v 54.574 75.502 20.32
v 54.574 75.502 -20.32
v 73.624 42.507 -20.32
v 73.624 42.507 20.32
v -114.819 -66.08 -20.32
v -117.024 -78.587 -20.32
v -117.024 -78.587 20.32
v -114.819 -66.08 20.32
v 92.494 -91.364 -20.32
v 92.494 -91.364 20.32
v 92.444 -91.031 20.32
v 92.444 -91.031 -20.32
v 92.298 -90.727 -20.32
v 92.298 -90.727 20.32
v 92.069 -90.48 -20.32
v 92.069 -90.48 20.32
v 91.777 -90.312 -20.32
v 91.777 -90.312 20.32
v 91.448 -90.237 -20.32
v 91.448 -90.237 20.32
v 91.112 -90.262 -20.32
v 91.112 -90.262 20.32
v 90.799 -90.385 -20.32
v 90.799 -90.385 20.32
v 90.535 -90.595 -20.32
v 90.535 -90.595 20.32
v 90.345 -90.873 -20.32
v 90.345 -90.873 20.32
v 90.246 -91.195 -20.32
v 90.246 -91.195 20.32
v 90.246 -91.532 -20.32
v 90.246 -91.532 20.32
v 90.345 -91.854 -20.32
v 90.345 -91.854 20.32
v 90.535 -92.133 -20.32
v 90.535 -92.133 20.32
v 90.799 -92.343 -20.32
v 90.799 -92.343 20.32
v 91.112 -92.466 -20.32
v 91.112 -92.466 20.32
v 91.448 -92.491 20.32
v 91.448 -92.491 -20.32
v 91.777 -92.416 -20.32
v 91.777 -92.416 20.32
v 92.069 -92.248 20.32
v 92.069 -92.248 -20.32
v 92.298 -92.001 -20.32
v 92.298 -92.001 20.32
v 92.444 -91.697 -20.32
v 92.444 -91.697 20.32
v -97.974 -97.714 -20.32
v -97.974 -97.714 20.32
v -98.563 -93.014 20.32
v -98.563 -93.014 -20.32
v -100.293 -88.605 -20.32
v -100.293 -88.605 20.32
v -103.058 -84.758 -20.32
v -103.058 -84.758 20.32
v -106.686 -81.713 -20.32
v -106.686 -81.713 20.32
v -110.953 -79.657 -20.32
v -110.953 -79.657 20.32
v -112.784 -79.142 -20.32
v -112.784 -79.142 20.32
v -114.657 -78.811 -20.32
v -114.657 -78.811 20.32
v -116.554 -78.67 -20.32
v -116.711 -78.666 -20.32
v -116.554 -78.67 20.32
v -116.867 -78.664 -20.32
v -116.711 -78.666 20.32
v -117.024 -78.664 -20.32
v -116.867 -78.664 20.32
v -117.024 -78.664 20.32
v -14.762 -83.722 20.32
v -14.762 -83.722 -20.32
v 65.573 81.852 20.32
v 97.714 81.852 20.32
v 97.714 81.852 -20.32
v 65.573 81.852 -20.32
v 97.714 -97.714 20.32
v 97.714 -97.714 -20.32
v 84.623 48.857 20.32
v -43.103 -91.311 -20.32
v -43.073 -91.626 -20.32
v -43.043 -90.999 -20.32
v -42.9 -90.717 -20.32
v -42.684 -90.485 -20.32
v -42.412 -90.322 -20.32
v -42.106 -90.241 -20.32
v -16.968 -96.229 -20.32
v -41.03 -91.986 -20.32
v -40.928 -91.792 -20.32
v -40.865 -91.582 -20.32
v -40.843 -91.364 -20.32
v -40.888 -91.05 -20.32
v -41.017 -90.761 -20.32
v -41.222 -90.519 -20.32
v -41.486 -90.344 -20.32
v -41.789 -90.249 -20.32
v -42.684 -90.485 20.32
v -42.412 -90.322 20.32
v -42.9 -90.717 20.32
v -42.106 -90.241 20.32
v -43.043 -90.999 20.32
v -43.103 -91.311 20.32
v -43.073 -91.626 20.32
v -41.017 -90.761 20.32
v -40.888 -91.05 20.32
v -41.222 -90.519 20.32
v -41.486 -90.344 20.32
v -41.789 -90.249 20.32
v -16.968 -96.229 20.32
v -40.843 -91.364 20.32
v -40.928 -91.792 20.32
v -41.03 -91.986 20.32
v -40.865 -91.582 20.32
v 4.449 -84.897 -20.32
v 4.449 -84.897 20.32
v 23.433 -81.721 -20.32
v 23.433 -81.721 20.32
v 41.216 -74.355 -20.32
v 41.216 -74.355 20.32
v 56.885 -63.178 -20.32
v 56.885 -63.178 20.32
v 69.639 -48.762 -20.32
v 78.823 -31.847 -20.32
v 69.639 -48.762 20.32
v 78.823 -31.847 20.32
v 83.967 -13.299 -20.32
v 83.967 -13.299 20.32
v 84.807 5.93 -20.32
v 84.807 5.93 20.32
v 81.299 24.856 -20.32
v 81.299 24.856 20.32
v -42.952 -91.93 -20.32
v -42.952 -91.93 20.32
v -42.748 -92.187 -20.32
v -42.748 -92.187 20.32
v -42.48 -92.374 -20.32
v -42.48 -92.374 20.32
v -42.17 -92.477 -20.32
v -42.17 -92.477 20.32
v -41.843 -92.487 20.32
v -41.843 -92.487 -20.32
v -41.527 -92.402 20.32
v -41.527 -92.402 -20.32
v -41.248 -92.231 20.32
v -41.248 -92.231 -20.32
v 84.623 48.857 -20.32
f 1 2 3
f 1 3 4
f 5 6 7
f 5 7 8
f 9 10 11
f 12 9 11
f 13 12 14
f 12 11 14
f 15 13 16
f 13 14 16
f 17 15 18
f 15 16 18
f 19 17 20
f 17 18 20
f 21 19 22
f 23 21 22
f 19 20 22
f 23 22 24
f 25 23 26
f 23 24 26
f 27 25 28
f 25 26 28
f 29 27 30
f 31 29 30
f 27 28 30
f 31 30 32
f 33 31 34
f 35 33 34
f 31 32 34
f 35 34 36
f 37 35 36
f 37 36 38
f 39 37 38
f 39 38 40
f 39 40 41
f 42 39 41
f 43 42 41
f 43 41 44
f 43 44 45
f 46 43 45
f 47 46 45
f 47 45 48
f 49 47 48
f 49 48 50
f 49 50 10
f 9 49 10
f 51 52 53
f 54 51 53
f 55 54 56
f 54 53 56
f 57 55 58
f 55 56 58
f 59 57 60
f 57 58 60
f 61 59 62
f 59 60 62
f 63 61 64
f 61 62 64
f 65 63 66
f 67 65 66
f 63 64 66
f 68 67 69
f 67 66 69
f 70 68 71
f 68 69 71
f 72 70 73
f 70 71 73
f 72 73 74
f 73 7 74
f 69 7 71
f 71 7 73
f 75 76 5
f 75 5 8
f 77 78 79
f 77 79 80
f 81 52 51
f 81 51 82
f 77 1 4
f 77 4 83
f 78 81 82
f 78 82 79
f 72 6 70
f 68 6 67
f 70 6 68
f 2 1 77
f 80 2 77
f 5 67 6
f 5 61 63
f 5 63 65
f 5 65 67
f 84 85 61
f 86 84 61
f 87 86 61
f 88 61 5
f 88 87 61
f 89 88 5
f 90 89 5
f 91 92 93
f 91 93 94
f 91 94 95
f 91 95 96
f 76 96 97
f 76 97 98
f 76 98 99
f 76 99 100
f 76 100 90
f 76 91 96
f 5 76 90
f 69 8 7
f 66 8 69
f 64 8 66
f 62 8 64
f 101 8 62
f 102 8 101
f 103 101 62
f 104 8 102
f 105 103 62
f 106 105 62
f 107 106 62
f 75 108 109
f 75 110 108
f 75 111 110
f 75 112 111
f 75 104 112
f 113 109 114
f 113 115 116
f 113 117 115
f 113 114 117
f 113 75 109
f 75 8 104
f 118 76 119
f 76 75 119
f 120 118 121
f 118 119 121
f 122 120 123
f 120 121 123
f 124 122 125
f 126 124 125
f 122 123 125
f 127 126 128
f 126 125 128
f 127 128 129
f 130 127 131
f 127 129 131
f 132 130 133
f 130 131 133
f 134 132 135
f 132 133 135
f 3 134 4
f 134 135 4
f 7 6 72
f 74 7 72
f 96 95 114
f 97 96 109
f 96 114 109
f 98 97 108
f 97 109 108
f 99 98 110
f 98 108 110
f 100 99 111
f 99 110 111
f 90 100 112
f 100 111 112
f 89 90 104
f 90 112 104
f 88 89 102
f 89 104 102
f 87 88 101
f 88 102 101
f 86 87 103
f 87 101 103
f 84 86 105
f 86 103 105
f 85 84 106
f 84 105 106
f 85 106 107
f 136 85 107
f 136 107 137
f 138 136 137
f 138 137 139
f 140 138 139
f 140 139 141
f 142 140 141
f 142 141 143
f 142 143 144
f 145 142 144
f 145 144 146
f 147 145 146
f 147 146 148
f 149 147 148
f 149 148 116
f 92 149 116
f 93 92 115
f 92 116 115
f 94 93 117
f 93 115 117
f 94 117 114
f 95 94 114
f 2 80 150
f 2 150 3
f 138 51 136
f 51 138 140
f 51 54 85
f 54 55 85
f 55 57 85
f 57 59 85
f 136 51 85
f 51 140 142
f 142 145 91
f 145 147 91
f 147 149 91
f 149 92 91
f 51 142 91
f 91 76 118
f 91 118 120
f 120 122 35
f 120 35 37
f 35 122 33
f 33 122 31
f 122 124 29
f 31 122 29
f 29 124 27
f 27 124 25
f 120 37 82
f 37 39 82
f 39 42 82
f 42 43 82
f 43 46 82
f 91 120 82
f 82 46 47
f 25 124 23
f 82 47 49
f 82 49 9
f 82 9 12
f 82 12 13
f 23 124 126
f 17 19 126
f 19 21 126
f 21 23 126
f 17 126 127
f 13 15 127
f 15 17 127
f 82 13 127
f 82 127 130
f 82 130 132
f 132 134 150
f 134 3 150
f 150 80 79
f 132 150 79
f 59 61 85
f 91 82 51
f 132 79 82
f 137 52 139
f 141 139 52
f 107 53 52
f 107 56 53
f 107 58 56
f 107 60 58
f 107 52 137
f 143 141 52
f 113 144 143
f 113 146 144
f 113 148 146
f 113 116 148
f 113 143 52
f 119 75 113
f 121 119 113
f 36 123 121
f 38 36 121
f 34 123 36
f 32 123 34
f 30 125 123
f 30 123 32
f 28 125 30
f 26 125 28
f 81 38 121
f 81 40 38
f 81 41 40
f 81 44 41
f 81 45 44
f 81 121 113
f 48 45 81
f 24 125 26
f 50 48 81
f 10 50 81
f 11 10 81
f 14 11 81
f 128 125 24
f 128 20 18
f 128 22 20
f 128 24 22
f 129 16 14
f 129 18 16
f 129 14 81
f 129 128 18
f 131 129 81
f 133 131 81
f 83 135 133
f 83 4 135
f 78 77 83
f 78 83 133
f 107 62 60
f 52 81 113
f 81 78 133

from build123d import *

# Parameters (mm, degrees)
BOSS_EXTRUDE1_DEPTH = 40.64
SKETCH6_R           = 1.1303
CUT_EXTRUDE1_DEPTH  = 158.779215984
SKETCH7_R           = 19.05
CUT_EXTRUDE2_DEPTH  = 158.779215984


with BuildPart() as part:
    # Sweep3: sweep along a path in Sketch2
    with BuildLine(Plane.XY) as sweep3_path:
        Line((-111.378641457, -46.568583299), (-11.322173751, -64.21123815))
        ThreePointArc((-11.322173751, -64.21123815), (53.410187761, -37.398216088), (56.466415172, 32.6009))
        Line((56.466415172, 32.6009), (37.416415172, 65.596467884))
    # 3DSketch1 → Sweep3 (sweep)
    with BuildSketch(Plane(origin=(-117.024291009, -78.586652965, -20.32), x_dir=(0.051794909001673446, 0.2937435257699459, 0.9544799780350292), z_dir=(0.984807753012208, -0.17364817766693055, 0))):
        Polygon((0, 0), (3.788092413, -12.121895721), (42.57815872, 0), (38.790066307, 12.121895721), align=None)
    sweep(path=sweep3_path.line)

    # Sketch5 → Boss-Extrude1 (add)
    with BuildSketch(Plane.XY.offset(20.32)):
        with BuildLine():
            Line((-16.967823303, -96.229307816), (-117.024291009, -78.586652965))
            Line((-117.024291009, -78.586652965), (-117.024291009, -97.7138))
            Line((-117.024291009, -97.7138), (3.02e-07, -97.7138))
            ThreePointArc((3.02e-07, -97.7138), (-8.516318665, -97.341969504), (-16.967823303, -96.229307816))
        make_face()
        with BuildLine():
            ThreePointArc((97.7138, -9e-08), (69.09409067, -69.094090521), (3.02e-07, -97.7138))
            Line((3.02e-07, -97.7138), (97.7138, -97.7138))
            Line((97.7138, -97.7138), (97.7138, -9e-08))
        make_face()
        with BuildLine():
            ThreePointArc((84.6226331, 48.8569), (94.384283017, 25.290192366), (97.7138, -9e-08))
            Line((97.7138, -9e-08), (97.7138, 81.852467884))
            Line((97.7138, 81.852467884), (65.5726331, 81.852467884))
            Line((65.5726331, 81.852467884), (84.6226331, 48.8569))
        make_face()
    extrude(amount=-BOSS_EXTRUDE1_DEPTH)

    # Sketch6 → Cut-Extrude1 (cut, through all)
    with BuildSketch(Plane.XY.offset(20.32)):
        with Locations((91.3638, -91.3638)):
            Circle(SKETCH6_R)
        with Locations((-41.9735, -91.3638)):
            Circle(SKETCH6_R)
    extrude(amount=-CUT_EXTRUDE1_DEPTH, mode=Mode.SUBTRACT)

    # Sketch7 → Cut-Extrude2 (cut, through all)
    with BuildSketch(Plane.XY.offset(20.32)):
        with Locations((-117.024291009, -97.7138)):
            Circle(SKETCH7_R)
    extrude(amount=-CUT_EXTRUDE2_DEPTH, mode=Mode.SUBTRACT)


solid = part.part
